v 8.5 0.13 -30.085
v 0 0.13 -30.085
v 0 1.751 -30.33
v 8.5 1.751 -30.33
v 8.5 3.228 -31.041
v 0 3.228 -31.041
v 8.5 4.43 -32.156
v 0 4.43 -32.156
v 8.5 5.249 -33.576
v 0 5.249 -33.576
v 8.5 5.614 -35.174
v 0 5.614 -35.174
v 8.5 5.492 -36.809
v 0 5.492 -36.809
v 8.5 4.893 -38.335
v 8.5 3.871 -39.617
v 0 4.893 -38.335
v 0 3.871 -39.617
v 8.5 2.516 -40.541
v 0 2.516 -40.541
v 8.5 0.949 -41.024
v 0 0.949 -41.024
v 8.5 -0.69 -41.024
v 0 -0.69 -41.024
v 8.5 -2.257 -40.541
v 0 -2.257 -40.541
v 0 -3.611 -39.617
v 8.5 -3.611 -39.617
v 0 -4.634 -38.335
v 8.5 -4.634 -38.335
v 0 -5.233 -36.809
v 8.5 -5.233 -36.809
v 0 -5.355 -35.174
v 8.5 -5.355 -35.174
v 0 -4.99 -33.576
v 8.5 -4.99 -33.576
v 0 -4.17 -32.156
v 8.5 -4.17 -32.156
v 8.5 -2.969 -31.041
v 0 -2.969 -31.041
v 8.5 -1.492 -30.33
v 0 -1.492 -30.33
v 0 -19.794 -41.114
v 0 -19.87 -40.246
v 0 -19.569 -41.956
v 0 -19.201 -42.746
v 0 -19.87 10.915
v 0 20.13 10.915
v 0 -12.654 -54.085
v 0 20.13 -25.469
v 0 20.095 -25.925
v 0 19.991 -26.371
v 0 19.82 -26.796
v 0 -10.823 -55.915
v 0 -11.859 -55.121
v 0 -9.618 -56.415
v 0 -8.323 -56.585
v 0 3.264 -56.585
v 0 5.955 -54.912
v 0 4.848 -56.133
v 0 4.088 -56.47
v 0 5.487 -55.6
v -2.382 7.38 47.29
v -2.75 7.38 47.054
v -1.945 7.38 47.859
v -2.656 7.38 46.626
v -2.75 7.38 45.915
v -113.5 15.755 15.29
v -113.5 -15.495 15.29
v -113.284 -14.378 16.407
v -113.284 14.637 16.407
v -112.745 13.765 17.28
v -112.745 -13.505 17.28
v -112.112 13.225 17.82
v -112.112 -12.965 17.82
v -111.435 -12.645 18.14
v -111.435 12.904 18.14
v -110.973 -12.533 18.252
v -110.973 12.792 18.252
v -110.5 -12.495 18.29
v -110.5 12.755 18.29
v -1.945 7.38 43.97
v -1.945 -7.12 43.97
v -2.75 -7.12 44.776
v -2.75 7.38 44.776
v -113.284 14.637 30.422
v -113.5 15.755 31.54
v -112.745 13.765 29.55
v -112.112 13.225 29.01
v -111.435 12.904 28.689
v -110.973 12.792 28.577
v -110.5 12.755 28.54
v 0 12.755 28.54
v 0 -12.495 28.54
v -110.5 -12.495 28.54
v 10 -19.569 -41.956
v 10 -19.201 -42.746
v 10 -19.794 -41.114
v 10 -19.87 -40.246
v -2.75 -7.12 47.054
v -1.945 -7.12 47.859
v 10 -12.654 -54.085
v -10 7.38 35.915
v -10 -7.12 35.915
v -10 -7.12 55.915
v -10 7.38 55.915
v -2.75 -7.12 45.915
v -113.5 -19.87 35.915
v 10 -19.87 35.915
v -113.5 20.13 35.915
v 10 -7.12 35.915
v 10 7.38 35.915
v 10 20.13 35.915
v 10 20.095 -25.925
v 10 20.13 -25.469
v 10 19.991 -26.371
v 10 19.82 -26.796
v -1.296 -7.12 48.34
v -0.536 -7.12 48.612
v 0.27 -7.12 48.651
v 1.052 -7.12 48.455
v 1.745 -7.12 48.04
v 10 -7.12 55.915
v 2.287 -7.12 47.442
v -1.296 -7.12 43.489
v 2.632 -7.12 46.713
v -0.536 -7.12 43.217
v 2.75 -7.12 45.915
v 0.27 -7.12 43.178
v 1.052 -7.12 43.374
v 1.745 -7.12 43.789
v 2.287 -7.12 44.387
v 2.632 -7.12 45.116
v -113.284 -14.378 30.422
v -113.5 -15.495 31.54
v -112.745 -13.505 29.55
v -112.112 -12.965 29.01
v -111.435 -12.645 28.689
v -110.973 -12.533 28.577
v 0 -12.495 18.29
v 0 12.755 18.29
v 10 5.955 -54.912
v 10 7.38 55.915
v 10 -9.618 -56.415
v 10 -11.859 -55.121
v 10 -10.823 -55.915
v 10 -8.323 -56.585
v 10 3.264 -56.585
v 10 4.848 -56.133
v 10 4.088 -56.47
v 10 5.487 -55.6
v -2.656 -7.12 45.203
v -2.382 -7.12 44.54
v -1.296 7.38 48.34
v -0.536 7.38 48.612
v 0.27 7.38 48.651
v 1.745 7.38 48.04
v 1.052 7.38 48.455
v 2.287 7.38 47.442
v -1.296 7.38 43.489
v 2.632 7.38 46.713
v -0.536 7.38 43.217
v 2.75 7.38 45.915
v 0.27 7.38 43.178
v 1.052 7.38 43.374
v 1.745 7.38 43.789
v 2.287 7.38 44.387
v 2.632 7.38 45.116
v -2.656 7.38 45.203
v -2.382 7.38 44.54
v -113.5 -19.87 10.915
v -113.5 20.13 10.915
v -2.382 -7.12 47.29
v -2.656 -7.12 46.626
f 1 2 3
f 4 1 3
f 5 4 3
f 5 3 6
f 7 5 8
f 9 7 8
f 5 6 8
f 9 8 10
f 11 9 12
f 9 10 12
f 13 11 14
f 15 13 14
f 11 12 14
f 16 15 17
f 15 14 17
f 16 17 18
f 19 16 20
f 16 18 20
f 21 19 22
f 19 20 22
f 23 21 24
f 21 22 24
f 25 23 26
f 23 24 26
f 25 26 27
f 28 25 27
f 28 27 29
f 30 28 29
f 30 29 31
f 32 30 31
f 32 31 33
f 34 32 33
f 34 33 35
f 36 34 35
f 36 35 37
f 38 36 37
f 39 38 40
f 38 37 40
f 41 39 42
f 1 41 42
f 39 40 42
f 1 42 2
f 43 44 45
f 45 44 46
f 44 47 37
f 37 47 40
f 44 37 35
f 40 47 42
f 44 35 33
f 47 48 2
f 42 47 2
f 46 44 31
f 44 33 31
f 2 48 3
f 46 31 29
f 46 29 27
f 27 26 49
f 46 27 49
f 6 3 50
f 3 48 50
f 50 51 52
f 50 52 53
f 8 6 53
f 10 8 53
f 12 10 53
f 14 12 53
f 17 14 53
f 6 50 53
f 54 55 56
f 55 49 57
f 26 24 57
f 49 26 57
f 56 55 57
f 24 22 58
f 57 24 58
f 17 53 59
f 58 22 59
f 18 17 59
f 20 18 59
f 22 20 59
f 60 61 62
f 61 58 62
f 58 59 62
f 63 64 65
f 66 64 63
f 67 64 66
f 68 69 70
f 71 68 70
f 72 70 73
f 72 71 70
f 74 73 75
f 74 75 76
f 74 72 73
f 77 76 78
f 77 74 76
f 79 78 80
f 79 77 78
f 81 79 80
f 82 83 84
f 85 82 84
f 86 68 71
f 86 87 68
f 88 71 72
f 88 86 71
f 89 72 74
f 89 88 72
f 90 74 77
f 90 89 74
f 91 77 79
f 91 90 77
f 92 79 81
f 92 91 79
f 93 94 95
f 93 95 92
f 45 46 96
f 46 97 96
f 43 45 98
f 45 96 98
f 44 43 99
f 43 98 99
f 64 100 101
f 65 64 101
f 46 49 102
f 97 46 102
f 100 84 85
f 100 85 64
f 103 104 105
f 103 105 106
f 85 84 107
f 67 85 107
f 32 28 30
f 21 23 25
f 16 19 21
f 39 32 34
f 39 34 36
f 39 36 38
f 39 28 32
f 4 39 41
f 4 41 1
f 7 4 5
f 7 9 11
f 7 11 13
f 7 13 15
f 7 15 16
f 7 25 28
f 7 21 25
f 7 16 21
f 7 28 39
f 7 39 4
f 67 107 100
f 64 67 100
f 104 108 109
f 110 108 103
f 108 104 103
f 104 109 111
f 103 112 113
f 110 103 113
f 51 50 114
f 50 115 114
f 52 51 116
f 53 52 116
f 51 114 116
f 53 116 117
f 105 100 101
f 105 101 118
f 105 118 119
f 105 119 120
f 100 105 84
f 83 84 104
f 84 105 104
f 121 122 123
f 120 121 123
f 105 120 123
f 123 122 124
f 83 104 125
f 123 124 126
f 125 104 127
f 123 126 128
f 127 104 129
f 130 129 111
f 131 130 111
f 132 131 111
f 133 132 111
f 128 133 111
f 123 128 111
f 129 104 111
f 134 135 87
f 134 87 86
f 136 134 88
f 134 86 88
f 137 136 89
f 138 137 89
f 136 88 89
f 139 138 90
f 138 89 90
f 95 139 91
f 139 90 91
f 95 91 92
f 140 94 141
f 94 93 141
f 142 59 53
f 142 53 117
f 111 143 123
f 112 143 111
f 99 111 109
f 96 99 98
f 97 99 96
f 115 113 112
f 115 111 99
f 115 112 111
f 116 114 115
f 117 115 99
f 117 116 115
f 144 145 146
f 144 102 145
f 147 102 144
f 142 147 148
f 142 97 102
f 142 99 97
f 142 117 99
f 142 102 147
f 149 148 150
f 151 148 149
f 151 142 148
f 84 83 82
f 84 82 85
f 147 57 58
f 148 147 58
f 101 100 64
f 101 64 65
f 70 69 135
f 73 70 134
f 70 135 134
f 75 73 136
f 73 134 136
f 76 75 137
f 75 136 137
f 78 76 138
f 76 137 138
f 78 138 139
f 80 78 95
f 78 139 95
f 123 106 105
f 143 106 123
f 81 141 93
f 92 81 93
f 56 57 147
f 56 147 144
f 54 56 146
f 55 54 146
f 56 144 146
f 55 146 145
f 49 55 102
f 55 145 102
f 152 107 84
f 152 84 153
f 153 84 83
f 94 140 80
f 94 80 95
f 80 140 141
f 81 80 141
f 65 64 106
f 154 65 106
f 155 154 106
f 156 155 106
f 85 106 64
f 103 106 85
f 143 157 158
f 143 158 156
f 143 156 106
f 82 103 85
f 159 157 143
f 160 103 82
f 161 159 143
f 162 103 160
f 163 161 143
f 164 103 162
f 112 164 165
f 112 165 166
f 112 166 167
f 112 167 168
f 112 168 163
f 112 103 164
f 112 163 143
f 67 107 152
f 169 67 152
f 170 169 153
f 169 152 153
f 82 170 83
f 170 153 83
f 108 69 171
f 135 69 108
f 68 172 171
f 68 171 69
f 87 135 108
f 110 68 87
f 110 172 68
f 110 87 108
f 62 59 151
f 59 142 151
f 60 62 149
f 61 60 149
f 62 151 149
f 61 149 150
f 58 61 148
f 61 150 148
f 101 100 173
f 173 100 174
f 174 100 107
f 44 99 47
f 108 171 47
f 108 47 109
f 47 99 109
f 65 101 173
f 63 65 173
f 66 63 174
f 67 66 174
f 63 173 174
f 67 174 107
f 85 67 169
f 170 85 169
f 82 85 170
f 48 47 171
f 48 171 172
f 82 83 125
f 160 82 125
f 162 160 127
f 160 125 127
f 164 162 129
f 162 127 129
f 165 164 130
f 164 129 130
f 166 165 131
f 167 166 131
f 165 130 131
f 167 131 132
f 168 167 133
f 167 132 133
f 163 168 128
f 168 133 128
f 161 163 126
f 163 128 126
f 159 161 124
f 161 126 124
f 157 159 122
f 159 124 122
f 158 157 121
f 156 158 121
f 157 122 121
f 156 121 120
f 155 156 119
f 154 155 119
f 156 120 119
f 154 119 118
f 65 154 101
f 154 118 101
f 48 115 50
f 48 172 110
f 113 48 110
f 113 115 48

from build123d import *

# Parameters (mm, degrees)
SKETCH1_W            = 92.5
SKETCH1_H            = 40
BOSS_EXTRUDE1_DEPTH  = 10
SKETCH5_R            = 5.5
CUT_EXTRUDE1_DEPTH   = 8.5
SKETCH4_W            = 25
SKETCH4_H            = 40
SKETCH4_W_2          = 10.25
SKETCH4_H_2          = 25.25
BOSS_EXTRUDE7_DEPTH  = 113.5
FILLET1_R            = 3
CHAMFER1_SIZE        = 15
CHAMFER1_SIZE2       = 30.41699103
FILLET3_R            = 3
CHAMFER3_SIZE        = 15
CHAMFER3_SIZE2       = 8.660254038
FILLET7_R            = 5
SKETCH7_W            = 20
SKETCH7_H            = 14.5
BOSS_EXTRUDE8_DEPTH  = 20
M5_CLEARANCE_HOLE1_D = 5.5
SPLIT1_START         = -7.120426829
SPLIT1_DEPTH         = 14.5
SPLIT1_2_DEPTH       = 14.5
SPLIT1_3_DEPTH       = 14.5


# Read off the part's stored shape, not the designer's step: Split1
with BuildPart() as part:
    # Sketch1 → Boss-Extrude1 (new body)
    with BuildSketch(Plane(origin=(0, 0, 0), x_dir=(0, 0, -1), z_dir=(1, 0, 0))):
        with Locations((10.335365854, 0.129573171)):
            Rectangle(SKETCH1_W, SKETCH1_H)
    extrude(amount=BOSS_EXTRUDE1_DEPTH)

    # Sketch5 → Cut-Extrude1 (cut)
    with BuildSketch(Plane.ZY):
        with Locations((-35.585365854, 0.129573171)):
            Circle(SKETCH5_R)
    extrude(amount=-CUT_EXTRUDE1_DEPTH, mode=Mode.SUBTRACT)

    # Sketch4 → Boss-Extrude7 (add)
    with BuildSketch(Plane.ZY):
        with Locations((23.414634146, 0.129573171)):
            Rectangle(SKETCH4_W, SKETCH4_H)
        with Locations((23.414634146, 0.129573171)):
            Rectangle(SKETCH4_W_2, SKETCH4_H_2, mode=Mode.SUBTRACT)
    extrude(amount=BOSS_EXTRUDE7_DEPTH)

    # Fillet1
    fillet1_edges = [part.edges().sort_by_distance(p)[0] for p in [
        (-113.5, 12.754573171, 23.414634146),
        (-113.5, 0.129573171, 18.289634146),
        (-113.5, -12.495426829, 23.414634146),
        (-113.5, 0.129573171, 28.539634146),
    ]]
    fillet(fillet1_edges, radius=FILLET1_R)

    # Chamfer1
    chamfer1_edges = [part.edges().sort_by_distance(p)[0] for p in [
        (5, 20.129573171, -56.585365854),
    ]]
    chamfer1_side = [part.faces().sort_by_distance(p)[0] for p in [
        (5, 0.129573171, -56.585365854),
    ]]
    chamfer(chamfer1_edges, length=CHAMFER1_SIZE, length2=CHAMFER1_SIZE2, reference=chamfer1_side[0])

    # Fillet3
    fillet3_edges = [part.edges().sort_by_distance(p)[0] for p in [
        (5, 20.129573171, -26.168374824),
        (5, 5.129573171, -56.585365854),
    ]]
    fillet(fillet3_edges, radius=FILLET3_R)

    # Chamfer3
    chamfer3_edges = [part.edges().sort_by_distance(p)[0] for p in [
        (5, -19.870426829, -56.585365854),
    ]]
    chamfer3_side = [part.faces().sort_by_distance(p)[0] for p in [
        (-41.568936877, -19.870426829, 15.117291954),
    ]]
    chamfer(chamfer3_edges, length=CHAMFER3_SIZE, length2=CHAMFER3_SIZE2, reference=chamfer3_side[0])

    # Fillet7
    fillet7_edges = [part.edges().sort_by_distance(p)[0] for p in [
        (5, -11.210172791, -56.585365854),
        (5, -19.870426829, -41.585365854),
    ]]
    fillet(fillet7_edges, radius=FILLET7_R)

    # Sketch7 → Boss-Extrude8 (add)
    with BuildSketch(Plane(origin=(10, 20.129573171, 35.914634146), x_dir=(1, 0, 0), z_dir=(0, 0, 1))):
        with Locations((-10, -20)):
            Rectangle(SKETCH7_W, SKETCH7_H)
    extrude(amount=BOSS_EXTRUDE8_DEPTH)

    # M5 Clearance Hole1 (through all)
    with Locations(Plane(origin=(0, 7.379573171, 0), x_dir=(1, 0, 0), z_dir=(0, 1, 0))):
        with Locations((0, -45.914634146)):
            Hole(M5_CLEARANCE_HOLE1_D / 2)

    # Split1 outline → Split1 (cut)
    with BuildSketch(Plane(origin=(0, 0, 0), x_dir=(1, 0, 0), z_dir=(0, 1, 0)).offset(SPLIT1_START)):
        with BuildLine():
            Line((-2.75, -45.914634146), (-2.75, -47.053721443))
            Line((-2.75, -47.053721443), (-1.944543648, -47.859177795))
            ThreePointArc((-1.944543648, -47.859177795), (-2.540668714, -46.967013585), (-2.75, -45.914634146))
        make_face()
        with BuildLine():
            Line((-2.75, -44.77554685), (-2.75, -45.914634146))
            ThreePointArc((-2.75, -45.914634146), (-2.540668714, -44.862254707), (-1.944543648, -43.970090498))
            Line((-1.944543648, -43.970090498), (-2.75, -44.77554685))
        make_face()
    extrude(amount=SPLIT1_DEPTH, mode=Mode.SUBTRACT)


with BuildPart() as body_2:
    # Split1 2 outline → Split1 2 (new body)
    with BuildSketch(Plane(origin=(0, 0, 0), x_dir=(1, 0, 0), z_dir=(0, 1, 0)).offset(SPLIT1_START)):
        with BuildLine():
            Line((-2.75, -45.914634146), (-2.75, -47.053721443))
            Line((-2.75, -47.053721443), (-1.944543648, -47.859177795))
            ThreePointArc((-1.944543648, -47.859177795), (-2.540668714, -46.967013585), (-2.75, -45.914634146))
        make_face()
    extrude(amount=SPLIT1_2_DEPTH)


with BuildPart() as body_3:
    # Split1 3 outline → Split1 3 (new body)
    with BuildSketch(Plane(origin=(0, 0, 0), x_dir=(1, 0, 0), z_dir=(0, 1, 0)).offset(SPLIT1_START)):
        with BuildLine():
            Line((-1.944543648, -43.970090498), (-2.75, -44.77554685))
            Line((-2.75, -44.77554685), (-2.75, -45.914634146))
            ThreePointArc((-2.75, -45.914634146), (-2.540668714, -44.862254707), (-1.944543648, -43.970090498))
        make_face()
    extrude(amount=SPLIT1_3_DEPTH)


solid = Compound([part.part, body_2.part, body_3.part])
